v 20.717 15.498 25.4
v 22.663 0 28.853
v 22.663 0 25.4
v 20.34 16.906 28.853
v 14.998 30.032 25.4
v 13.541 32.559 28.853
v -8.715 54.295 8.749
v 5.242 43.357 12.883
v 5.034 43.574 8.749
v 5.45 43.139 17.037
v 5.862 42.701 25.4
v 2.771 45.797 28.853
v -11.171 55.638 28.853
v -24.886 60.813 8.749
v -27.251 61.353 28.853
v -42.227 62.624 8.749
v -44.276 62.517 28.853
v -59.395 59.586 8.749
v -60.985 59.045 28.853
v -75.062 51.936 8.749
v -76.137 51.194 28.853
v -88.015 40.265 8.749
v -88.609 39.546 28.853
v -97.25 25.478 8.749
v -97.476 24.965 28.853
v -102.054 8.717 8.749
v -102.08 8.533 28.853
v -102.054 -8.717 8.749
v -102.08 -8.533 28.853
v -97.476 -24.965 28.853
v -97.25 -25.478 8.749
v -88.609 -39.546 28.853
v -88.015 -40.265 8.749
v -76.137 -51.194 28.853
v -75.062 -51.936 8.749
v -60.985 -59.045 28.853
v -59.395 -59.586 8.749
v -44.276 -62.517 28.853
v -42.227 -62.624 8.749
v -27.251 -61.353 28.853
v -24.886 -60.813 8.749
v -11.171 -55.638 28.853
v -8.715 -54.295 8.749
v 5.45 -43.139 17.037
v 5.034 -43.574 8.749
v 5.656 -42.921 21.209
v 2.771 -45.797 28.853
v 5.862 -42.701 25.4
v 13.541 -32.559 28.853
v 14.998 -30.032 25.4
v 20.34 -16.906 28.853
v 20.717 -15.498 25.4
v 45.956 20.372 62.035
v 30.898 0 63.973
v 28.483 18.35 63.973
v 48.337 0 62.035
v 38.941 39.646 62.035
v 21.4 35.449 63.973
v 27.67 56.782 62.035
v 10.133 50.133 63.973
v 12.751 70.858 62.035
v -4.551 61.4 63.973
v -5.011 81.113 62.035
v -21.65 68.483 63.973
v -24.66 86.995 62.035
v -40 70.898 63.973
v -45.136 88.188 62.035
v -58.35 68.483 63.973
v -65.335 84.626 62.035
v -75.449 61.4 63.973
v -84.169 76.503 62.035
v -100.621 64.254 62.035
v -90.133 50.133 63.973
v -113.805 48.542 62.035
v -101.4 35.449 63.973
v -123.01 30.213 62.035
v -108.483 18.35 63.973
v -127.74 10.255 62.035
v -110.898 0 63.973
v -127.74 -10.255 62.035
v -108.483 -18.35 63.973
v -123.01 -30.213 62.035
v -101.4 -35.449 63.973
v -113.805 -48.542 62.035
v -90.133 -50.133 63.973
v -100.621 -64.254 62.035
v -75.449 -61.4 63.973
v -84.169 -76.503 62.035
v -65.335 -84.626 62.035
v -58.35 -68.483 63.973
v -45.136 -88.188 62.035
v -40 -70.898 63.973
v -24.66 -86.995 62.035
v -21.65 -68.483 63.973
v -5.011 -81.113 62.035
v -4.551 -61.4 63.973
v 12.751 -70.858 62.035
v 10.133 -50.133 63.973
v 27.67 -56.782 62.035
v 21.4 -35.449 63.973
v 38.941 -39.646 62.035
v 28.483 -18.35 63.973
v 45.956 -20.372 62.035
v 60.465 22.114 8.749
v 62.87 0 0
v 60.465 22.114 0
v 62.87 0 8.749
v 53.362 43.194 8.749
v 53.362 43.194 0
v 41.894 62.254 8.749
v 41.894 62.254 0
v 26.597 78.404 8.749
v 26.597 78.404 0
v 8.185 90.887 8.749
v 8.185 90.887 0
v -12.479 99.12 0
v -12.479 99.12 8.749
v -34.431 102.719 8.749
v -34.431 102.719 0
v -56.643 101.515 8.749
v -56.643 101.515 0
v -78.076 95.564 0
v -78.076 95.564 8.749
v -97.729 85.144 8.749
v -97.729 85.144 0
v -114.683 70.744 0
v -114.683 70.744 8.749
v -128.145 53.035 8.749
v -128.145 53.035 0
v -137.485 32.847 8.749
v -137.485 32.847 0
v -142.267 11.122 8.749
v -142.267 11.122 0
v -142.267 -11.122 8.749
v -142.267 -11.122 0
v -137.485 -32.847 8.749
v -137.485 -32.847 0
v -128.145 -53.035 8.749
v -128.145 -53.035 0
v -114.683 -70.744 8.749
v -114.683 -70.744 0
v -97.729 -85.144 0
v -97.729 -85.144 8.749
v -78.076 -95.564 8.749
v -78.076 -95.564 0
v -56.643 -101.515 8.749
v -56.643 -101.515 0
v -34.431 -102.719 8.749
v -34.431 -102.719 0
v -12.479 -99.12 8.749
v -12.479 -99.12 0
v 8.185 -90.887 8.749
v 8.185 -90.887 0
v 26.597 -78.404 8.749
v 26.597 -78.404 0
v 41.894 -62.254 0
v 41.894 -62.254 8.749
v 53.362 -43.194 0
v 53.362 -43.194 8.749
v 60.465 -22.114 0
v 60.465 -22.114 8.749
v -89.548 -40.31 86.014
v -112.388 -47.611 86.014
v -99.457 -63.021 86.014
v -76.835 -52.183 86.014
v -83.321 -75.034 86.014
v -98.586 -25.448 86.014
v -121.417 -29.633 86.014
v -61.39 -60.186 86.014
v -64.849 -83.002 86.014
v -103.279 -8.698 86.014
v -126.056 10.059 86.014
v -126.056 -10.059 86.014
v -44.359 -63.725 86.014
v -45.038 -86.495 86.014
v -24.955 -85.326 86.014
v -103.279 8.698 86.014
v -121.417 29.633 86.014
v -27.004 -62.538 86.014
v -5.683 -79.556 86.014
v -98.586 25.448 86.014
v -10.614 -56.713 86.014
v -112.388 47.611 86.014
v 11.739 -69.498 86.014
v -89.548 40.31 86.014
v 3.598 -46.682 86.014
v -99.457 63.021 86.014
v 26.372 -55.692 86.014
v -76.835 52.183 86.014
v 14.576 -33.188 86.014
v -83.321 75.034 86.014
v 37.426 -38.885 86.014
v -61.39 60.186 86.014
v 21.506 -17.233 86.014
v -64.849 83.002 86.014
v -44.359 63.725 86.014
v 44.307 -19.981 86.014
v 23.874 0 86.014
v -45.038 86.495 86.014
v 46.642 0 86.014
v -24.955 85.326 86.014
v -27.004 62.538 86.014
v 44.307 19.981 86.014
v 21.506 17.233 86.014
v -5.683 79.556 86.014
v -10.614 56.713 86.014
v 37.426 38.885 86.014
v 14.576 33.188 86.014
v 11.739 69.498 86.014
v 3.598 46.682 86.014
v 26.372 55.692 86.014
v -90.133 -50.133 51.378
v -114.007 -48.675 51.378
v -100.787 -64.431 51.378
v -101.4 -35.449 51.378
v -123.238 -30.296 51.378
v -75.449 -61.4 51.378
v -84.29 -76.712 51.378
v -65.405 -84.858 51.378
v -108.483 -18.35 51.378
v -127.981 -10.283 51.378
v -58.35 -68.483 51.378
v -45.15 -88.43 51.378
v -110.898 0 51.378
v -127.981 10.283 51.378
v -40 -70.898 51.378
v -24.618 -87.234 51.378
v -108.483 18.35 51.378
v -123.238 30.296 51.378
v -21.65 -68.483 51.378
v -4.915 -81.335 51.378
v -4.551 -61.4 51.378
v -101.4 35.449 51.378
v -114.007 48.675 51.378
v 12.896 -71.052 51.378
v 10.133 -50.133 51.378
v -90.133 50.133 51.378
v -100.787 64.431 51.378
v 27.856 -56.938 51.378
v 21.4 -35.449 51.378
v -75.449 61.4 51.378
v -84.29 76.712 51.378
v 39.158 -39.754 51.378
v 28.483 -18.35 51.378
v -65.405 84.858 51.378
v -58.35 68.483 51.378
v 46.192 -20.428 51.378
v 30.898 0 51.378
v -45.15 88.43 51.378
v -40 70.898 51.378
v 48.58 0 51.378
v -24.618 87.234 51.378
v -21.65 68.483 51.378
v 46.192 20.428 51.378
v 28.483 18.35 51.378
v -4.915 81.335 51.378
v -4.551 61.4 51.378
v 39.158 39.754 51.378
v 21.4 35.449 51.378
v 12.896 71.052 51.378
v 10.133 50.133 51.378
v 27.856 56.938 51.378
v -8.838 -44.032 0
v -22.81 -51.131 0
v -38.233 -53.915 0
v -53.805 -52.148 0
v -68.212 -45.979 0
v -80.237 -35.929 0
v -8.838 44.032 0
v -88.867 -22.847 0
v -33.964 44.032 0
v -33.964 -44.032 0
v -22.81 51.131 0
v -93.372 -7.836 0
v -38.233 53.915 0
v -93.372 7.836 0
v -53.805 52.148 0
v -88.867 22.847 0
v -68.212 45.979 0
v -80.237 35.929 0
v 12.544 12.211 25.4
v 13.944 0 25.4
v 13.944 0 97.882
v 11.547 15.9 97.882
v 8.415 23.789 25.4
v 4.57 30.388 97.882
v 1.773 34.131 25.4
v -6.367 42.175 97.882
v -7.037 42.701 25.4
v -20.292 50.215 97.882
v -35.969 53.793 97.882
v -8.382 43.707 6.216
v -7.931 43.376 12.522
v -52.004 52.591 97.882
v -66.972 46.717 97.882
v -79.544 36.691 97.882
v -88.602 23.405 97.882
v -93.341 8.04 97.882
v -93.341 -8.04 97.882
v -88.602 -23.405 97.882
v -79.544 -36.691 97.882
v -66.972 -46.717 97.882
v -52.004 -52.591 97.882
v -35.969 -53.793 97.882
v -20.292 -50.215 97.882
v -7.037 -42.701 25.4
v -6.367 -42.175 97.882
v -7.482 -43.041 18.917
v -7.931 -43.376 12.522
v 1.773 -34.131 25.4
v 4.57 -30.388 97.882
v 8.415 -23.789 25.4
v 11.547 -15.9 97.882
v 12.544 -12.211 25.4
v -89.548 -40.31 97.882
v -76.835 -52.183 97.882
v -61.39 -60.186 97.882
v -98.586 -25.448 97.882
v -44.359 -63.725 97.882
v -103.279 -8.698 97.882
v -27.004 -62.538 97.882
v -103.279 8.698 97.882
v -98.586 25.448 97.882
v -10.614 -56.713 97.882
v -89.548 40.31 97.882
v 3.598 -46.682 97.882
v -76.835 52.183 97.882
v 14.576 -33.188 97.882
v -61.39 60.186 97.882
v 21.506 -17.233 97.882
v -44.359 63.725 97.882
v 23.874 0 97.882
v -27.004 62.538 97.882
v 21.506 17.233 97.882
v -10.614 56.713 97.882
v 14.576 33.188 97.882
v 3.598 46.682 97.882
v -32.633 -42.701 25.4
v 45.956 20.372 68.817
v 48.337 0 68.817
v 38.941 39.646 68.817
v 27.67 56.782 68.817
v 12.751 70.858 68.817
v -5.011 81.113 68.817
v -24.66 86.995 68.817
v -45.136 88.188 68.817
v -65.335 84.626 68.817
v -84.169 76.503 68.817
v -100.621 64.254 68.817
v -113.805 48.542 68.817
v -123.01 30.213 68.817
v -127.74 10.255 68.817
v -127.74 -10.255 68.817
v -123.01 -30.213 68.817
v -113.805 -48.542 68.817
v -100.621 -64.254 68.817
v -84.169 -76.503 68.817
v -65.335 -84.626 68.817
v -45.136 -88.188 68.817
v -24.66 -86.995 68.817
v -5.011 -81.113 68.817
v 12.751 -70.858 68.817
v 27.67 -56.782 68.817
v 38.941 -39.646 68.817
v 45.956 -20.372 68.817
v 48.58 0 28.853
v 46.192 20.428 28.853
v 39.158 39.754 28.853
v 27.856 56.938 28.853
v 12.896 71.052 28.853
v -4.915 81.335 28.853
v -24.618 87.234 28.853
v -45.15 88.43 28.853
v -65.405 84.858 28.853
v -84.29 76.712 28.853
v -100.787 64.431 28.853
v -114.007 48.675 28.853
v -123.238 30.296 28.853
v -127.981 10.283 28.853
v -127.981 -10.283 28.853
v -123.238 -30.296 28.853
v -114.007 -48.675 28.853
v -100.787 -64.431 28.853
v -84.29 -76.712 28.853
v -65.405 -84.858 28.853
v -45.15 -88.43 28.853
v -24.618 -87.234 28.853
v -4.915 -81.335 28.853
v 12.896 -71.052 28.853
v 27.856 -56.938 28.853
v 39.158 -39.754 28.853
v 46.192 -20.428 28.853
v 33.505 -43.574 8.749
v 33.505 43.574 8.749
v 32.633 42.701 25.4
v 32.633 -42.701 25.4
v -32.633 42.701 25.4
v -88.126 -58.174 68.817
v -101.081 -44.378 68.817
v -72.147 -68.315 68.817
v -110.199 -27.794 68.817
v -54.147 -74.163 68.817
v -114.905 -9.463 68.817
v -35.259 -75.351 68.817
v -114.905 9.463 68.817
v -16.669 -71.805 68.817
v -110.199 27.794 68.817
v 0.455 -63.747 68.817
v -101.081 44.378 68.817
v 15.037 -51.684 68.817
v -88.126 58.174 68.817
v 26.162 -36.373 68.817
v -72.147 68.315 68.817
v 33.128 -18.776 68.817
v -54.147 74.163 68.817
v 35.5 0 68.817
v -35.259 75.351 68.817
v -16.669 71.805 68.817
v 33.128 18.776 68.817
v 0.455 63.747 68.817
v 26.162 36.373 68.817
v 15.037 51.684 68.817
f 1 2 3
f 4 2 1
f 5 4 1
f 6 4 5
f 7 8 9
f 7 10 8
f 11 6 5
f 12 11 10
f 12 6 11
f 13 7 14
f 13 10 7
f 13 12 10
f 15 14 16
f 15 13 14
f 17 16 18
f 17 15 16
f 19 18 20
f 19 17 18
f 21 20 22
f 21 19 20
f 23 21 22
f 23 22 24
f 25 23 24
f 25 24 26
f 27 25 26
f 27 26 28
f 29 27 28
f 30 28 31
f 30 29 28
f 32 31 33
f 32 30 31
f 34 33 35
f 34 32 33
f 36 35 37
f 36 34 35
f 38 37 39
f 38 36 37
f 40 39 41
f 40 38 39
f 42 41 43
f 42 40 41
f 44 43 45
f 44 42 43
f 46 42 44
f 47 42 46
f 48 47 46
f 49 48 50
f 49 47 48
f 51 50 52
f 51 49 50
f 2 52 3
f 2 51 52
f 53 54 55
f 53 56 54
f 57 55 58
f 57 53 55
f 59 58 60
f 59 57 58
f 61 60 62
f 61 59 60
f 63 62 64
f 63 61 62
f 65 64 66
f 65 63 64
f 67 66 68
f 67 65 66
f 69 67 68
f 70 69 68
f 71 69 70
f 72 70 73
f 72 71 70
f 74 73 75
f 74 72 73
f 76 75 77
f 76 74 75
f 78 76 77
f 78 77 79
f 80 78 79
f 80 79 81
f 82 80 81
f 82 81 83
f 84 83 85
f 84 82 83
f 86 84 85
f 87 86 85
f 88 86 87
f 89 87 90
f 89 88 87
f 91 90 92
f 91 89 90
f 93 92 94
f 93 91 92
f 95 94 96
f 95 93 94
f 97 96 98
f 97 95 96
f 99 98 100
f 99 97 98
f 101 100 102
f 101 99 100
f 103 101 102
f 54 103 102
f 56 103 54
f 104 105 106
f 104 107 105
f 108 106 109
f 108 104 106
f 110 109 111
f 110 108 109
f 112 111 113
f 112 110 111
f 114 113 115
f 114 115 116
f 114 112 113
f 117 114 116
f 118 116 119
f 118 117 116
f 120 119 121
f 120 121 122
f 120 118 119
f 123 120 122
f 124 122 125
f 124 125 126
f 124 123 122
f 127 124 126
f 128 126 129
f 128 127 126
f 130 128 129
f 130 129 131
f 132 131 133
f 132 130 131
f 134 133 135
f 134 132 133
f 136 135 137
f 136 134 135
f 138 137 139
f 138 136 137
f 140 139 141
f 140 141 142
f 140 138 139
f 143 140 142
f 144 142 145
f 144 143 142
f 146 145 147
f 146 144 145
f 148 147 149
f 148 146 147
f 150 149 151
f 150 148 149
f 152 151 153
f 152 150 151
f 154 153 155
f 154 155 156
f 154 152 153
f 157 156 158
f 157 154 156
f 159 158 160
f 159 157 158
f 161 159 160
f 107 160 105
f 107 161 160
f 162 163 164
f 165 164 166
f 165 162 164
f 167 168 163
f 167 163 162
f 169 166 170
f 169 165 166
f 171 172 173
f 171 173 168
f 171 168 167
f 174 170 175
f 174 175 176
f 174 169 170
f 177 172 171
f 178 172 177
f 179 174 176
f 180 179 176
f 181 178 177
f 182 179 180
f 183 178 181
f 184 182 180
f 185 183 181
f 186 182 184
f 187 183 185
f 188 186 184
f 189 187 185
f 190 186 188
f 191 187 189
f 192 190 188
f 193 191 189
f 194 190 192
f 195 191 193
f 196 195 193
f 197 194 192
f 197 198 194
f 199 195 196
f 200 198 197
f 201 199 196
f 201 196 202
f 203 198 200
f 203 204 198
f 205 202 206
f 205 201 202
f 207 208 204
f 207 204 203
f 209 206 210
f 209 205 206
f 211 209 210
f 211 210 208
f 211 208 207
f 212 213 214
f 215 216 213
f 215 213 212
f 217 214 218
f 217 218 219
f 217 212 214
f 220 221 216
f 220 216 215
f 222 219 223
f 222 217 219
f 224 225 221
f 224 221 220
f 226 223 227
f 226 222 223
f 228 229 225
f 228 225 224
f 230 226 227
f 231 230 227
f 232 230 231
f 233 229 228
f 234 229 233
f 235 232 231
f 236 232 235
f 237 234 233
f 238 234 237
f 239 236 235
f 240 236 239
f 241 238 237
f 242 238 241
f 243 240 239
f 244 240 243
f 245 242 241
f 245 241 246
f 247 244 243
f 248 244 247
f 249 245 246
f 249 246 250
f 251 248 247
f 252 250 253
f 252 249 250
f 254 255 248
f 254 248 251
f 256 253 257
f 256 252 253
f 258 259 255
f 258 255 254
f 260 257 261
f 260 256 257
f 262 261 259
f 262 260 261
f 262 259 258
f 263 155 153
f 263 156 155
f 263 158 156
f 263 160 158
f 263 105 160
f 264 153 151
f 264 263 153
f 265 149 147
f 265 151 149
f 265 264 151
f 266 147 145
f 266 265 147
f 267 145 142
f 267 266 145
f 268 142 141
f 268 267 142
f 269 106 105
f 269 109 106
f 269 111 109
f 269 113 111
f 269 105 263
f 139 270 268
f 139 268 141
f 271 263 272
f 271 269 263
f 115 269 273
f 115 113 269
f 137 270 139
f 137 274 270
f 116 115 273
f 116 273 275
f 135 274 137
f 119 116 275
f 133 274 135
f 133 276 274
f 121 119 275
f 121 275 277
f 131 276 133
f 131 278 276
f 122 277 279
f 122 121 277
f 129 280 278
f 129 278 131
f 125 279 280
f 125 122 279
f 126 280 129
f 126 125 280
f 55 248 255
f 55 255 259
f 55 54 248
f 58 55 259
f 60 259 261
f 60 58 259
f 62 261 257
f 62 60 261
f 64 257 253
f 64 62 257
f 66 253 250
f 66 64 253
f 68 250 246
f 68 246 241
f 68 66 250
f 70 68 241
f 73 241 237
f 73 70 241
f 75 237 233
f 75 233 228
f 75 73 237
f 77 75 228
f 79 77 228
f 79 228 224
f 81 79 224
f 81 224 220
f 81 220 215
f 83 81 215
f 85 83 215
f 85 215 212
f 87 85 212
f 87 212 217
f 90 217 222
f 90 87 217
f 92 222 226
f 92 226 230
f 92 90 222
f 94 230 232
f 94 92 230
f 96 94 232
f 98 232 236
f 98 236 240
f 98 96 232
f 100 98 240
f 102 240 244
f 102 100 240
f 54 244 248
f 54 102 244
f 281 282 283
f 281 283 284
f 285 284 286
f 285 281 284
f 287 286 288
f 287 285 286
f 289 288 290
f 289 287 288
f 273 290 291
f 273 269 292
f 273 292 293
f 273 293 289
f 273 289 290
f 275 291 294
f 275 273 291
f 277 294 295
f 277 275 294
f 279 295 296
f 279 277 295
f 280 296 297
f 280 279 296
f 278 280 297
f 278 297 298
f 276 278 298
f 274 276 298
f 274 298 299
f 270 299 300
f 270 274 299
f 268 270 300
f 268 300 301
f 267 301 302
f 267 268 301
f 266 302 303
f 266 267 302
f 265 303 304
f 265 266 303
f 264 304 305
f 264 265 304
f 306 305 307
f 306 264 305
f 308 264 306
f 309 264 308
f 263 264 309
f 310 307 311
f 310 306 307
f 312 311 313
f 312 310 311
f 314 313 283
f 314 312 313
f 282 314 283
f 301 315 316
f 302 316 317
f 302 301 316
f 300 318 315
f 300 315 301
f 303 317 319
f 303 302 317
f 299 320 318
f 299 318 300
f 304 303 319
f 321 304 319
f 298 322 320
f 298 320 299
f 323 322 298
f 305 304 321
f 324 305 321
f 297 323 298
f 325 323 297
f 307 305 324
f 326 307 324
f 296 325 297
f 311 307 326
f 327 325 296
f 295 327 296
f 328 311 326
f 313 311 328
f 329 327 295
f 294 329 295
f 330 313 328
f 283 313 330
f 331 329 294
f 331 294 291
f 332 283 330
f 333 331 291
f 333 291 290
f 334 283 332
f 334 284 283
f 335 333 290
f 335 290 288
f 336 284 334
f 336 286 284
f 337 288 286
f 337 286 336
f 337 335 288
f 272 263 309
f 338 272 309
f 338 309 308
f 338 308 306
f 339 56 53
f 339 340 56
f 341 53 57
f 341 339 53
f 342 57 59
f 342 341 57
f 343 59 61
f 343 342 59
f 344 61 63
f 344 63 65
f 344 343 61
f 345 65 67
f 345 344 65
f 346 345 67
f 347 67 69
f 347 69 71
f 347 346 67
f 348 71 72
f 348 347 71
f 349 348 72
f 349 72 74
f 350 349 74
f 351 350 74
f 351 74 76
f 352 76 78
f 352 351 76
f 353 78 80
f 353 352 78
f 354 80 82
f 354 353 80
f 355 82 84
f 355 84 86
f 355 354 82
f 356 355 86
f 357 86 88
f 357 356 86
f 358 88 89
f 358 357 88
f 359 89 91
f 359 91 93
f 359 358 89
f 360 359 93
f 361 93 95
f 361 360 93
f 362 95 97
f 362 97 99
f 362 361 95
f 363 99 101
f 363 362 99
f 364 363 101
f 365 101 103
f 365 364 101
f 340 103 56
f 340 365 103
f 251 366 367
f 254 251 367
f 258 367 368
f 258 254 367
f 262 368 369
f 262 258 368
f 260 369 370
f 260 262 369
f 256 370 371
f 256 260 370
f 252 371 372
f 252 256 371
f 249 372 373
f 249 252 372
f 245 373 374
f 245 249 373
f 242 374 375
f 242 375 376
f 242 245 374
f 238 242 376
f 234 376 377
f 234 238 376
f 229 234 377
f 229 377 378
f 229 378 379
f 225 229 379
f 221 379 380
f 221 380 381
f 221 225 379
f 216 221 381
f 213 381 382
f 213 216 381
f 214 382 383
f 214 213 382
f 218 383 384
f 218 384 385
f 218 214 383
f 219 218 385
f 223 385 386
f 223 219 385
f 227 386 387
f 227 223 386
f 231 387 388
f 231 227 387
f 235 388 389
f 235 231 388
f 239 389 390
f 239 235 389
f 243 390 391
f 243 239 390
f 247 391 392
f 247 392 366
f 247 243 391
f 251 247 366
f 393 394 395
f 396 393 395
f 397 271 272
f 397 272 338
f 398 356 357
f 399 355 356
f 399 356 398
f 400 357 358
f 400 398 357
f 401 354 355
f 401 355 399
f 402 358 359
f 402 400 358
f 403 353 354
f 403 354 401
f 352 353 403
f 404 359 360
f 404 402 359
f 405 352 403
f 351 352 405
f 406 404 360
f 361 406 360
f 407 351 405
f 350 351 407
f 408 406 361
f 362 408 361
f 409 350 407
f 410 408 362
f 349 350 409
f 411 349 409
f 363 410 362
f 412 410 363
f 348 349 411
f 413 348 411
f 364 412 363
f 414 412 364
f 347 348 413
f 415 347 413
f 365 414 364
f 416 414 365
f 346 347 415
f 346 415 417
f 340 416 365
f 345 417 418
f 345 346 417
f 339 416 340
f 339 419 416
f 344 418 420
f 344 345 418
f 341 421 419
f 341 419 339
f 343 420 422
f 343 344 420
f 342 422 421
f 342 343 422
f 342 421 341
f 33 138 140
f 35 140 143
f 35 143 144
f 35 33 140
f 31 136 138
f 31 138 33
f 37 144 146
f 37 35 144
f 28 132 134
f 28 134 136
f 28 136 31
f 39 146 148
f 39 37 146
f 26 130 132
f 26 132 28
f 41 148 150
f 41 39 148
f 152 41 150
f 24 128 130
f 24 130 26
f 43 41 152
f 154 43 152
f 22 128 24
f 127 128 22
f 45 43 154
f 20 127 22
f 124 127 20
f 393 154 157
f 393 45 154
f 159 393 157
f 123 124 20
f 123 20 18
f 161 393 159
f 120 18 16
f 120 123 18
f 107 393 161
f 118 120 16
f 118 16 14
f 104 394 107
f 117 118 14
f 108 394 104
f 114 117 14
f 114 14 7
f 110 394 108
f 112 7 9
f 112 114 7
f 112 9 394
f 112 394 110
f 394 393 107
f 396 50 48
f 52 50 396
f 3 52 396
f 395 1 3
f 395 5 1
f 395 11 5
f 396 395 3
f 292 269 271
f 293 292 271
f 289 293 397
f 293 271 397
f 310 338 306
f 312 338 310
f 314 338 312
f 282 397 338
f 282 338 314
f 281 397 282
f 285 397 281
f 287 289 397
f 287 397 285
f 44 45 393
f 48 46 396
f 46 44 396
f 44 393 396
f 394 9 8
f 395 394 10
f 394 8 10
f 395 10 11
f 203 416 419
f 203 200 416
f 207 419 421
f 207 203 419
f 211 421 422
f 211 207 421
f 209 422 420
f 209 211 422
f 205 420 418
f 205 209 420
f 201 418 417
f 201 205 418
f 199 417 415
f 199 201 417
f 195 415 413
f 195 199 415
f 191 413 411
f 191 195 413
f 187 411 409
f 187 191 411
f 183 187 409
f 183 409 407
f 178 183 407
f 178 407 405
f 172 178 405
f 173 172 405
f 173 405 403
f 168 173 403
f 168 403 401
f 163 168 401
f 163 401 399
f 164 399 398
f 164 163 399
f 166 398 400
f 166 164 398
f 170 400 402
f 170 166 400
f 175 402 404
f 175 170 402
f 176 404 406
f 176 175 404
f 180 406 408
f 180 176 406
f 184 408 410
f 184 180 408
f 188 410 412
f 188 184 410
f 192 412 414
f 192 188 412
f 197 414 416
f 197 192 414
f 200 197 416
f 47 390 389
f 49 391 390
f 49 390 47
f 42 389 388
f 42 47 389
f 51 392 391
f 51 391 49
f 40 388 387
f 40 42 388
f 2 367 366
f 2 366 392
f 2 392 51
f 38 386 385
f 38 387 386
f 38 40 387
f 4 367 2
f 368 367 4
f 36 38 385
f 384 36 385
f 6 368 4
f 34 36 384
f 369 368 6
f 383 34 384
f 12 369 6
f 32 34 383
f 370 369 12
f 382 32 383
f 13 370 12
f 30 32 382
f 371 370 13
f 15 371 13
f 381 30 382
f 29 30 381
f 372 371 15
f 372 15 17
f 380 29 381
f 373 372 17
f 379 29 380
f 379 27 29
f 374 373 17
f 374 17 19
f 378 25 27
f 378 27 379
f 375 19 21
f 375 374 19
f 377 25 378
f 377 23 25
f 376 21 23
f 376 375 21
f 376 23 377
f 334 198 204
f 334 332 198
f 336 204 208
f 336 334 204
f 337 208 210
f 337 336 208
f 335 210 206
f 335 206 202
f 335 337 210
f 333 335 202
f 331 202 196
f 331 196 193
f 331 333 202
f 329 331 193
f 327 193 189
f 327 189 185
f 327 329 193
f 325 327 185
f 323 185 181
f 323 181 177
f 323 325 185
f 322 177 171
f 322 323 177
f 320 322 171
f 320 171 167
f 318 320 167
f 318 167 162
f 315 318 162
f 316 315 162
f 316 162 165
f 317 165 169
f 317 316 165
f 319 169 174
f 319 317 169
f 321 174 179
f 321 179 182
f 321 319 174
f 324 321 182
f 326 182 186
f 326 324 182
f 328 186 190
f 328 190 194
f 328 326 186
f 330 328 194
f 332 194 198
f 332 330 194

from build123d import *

# Parameters (mm, degrees)
F0_W     = 67.9279565811
F0_H     = 88.0647003651
F1_DEPTH = 25.4
F1_TAPER = 3


# Not quite as in the source:
# - a feature of the source that left no trace in its solid (it failed there, or was rolled back) is left out


with BuildPart() as f1:
    # F0 (on Top) → F1 (new body)
    with BuildSketch(Plane.XY):
        Rectangle(F0_W, F0_H)
    extrude(amount=F1_DEPTH, taper=F1_TAPER)

    # F2 (on Front) → F3 (revolve)
    with BuildSketch(Plane.XZ):
        Polygon((13.9438202605, 97.8820249438), (13.9438202605, 0), (62.8700107336, 0), (62.8700107336, 8.7491702288), (22.6633418351, 8.7491702288), (22.6633418351, 28.8525056094), (48.57968539, 28.8525056094), (48.57968539, 51.3779297471), (30.8984406292, 51.3779297471), (30.8984406292, 63.9727860689), (48.3374781907, 62.0351172984), (48.3374781907, 68.8169673085), (35.5004072189, 68.8169673085), (46.6420166194, 86.0137939453), (23.8743834198, 86.0137939453), (23.8743834198, 97.8820249438), align=None)
    revolve(axis=Axis((-40, 0, 38.2511918375), (0, 0, 1)))


solid = f1.part
